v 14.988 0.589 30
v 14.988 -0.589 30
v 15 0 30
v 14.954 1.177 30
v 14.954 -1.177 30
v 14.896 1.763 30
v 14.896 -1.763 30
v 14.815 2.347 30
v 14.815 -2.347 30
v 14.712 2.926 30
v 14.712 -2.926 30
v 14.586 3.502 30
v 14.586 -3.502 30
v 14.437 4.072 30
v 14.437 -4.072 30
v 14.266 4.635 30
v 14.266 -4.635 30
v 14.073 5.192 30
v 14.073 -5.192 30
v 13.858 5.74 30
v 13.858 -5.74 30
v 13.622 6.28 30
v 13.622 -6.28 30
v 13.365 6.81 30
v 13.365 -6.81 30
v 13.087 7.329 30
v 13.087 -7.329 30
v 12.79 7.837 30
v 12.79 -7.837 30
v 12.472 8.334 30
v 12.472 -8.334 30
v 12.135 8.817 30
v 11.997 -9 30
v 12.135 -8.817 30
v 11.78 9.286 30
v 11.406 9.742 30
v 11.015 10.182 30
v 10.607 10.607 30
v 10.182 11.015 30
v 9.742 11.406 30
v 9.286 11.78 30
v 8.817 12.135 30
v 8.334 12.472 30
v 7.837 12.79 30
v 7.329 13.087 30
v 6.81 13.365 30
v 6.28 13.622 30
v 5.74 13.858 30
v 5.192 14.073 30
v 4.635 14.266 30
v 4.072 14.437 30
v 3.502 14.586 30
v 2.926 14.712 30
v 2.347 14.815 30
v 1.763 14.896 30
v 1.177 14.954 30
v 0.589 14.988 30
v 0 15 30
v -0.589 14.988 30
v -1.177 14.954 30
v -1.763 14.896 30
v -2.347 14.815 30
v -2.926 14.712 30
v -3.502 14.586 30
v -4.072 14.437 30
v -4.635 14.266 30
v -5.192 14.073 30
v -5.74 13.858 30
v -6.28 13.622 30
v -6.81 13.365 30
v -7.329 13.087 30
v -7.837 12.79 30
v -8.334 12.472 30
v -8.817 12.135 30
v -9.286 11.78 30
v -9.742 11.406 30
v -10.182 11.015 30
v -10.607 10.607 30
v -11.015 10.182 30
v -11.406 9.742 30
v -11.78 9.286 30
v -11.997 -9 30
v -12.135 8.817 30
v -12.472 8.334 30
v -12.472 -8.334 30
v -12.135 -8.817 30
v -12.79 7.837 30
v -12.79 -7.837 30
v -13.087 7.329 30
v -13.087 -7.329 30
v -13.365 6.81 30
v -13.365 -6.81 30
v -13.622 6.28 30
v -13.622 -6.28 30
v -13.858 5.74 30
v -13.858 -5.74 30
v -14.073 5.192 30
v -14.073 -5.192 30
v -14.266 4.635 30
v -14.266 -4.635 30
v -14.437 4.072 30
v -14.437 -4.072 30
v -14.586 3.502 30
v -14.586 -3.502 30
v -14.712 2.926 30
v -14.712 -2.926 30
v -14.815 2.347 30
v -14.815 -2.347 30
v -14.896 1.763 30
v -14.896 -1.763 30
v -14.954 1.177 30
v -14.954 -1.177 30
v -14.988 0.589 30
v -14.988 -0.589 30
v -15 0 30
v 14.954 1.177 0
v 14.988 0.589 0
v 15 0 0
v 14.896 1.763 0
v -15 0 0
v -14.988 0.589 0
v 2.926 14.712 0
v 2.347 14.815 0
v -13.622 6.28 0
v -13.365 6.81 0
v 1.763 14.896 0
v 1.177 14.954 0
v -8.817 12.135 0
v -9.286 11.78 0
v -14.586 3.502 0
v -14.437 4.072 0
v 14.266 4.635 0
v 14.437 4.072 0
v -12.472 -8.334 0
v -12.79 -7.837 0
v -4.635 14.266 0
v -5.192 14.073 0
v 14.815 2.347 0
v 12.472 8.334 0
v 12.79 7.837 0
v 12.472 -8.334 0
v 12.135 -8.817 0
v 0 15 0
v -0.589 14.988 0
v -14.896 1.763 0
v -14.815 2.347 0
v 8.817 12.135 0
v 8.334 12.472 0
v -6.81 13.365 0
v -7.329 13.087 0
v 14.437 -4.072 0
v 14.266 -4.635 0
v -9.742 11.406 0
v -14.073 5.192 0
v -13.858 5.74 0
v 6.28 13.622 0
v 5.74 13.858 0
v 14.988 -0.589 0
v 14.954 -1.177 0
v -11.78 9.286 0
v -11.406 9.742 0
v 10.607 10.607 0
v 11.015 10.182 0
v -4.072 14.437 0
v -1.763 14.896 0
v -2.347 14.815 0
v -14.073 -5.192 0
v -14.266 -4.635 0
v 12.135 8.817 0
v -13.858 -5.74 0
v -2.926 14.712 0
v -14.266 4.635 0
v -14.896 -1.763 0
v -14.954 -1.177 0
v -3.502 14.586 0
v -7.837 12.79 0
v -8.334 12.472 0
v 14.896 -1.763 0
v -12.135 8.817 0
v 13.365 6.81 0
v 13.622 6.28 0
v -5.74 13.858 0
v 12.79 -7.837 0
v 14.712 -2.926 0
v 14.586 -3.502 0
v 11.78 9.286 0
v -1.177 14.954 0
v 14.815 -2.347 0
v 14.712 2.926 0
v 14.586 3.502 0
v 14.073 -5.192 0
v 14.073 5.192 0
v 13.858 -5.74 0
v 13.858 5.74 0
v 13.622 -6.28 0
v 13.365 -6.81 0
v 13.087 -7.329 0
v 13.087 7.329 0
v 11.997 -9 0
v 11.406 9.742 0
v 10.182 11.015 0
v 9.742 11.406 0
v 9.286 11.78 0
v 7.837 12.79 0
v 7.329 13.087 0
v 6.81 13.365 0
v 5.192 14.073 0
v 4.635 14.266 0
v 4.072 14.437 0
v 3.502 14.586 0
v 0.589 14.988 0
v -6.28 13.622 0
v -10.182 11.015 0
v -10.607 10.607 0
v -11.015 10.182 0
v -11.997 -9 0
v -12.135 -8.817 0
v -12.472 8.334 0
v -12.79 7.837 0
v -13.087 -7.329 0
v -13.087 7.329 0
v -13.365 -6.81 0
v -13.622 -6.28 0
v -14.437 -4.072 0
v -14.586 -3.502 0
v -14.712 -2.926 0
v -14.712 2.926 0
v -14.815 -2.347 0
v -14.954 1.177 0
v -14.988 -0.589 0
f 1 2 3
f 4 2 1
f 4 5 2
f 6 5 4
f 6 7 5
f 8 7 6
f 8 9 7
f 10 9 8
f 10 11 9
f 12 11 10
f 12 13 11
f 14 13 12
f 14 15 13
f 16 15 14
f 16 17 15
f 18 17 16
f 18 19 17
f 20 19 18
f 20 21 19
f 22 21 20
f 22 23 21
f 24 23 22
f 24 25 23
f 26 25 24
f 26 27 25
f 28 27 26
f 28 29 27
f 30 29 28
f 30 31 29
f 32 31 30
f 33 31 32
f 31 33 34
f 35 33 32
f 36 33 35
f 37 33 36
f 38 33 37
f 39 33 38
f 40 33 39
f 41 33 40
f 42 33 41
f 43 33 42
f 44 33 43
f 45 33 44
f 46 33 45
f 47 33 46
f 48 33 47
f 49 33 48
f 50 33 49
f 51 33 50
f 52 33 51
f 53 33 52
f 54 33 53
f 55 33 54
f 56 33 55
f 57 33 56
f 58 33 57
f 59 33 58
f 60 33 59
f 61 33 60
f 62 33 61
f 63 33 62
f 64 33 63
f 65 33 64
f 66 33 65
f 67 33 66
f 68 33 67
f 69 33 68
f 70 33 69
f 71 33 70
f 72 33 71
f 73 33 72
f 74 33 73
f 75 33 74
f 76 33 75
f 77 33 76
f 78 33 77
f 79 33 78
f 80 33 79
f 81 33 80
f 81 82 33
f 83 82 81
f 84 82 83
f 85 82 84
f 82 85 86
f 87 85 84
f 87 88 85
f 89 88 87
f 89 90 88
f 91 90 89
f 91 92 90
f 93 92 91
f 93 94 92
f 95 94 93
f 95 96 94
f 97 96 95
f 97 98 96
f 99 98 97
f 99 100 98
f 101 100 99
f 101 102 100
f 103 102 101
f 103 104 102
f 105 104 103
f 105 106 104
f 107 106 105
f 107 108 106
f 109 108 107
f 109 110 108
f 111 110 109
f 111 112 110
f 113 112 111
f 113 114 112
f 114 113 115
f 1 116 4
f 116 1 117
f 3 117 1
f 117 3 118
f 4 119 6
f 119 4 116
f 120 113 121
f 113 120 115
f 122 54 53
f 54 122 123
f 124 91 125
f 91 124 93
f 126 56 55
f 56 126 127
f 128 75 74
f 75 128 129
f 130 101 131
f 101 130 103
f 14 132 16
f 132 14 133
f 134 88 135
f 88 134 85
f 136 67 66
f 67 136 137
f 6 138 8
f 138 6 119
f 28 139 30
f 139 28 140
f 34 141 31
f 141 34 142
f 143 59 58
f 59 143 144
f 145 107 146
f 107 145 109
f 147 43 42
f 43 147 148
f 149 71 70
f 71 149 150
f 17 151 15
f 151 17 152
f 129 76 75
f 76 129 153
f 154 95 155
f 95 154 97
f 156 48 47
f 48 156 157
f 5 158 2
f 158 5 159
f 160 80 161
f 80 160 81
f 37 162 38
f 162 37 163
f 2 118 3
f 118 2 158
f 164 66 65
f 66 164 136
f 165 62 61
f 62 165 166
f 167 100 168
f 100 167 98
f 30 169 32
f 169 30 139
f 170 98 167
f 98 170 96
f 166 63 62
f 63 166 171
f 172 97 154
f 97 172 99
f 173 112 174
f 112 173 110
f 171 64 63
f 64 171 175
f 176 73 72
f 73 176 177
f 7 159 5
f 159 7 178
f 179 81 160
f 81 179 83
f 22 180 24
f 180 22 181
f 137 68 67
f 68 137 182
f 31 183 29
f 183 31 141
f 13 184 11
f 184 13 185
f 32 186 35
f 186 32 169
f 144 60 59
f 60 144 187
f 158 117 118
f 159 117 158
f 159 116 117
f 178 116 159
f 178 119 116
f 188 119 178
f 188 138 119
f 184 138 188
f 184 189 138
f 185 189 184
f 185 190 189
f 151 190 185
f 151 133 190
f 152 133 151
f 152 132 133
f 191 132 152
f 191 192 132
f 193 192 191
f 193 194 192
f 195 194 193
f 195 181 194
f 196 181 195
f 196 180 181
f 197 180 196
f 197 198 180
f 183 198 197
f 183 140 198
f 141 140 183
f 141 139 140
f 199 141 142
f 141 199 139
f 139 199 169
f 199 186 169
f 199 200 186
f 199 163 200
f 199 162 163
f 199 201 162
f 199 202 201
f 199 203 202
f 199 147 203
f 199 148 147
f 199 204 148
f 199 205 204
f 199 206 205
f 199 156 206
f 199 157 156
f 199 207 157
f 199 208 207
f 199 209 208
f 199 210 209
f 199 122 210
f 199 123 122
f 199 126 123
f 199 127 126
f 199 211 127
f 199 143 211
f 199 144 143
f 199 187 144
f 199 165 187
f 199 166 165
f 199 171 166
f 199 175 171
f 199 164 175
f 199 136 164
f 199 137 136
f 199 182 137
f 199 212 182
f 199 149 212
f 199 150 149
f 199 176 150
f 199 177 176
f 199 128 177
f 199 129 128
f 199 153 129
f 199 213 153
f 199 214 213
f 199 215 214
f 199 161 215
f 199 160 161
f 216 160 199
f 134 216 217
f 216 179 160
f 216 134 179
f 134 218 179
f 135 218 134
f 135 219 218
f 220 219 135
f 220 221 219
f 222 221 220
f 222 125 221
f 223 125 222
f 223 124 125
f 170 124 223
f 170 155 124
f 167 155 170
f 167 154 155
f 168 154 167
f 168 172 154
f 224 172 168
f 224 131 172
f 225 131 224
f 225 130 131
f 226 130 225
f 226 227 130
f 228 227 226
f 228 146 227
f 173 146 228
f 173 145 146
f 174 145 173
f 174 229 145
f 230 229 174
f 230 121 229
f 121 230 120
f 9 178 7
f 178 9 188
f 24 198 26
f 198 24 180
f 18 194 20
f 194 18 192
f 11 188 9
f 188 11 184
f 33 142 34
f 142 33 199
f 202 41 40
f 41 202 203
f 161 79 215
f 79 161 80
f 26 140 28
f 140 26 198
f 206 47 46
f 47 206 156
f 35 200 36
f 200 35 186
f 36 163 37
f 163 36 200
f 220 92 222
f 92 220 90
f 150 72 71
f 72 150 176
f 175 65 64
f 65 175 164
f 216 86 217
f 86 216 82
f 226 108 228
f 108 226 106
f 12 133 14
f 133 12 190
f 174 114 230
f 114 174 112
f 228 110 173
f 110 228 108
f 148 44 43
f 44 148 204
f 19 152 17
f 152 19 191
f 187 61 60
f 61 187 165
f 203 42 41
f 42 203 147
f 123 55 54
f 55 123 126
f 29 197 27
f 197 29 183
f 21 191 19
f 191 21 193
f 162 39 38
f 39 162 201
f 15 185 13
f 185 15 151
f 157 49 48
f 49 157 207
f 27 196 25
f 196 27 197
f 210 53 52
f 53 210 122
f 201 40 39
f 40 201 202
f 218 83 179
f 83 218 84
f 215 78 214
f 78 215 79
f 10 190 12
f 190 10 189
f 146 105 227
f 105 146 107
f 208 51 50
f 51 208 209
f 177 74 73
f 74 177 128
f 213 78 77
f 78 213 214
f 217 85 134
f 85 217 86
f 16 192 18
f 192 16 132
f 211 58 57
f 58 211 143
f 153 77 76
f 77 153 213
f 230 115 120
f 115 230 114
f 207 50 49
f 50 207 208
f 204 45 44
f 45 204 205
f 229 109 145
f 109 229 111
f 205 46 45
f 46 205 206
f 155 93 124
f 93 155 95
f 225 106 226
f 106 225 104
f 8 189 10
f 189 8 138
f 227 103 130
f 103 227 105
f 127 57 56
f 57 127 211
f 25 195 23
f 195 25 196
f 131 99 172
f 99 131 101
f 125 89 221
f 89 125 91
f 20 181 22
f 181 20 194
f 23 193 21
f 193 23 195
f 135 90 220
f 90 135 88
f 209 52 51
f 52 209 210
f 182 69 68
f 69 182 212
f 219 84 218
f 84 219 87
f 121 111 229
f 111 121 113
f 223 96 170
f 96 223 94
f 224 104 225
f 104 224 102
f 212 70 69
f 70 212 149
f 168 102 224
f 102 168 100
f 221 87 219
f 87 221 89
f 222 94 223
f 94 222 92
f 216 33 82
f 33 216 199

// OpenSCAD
// Smooth-wall test: 30 mm tall, round on one side and flat on the other, so layer lines show on both kinds of wall.
// Raking light along the flat face shows banding best.
$fn = 160;
intersection() {
    cylinder(d = 30, h = 30);
    translate([-15, -9, 0]) cube([30, 24, 30]);
}
